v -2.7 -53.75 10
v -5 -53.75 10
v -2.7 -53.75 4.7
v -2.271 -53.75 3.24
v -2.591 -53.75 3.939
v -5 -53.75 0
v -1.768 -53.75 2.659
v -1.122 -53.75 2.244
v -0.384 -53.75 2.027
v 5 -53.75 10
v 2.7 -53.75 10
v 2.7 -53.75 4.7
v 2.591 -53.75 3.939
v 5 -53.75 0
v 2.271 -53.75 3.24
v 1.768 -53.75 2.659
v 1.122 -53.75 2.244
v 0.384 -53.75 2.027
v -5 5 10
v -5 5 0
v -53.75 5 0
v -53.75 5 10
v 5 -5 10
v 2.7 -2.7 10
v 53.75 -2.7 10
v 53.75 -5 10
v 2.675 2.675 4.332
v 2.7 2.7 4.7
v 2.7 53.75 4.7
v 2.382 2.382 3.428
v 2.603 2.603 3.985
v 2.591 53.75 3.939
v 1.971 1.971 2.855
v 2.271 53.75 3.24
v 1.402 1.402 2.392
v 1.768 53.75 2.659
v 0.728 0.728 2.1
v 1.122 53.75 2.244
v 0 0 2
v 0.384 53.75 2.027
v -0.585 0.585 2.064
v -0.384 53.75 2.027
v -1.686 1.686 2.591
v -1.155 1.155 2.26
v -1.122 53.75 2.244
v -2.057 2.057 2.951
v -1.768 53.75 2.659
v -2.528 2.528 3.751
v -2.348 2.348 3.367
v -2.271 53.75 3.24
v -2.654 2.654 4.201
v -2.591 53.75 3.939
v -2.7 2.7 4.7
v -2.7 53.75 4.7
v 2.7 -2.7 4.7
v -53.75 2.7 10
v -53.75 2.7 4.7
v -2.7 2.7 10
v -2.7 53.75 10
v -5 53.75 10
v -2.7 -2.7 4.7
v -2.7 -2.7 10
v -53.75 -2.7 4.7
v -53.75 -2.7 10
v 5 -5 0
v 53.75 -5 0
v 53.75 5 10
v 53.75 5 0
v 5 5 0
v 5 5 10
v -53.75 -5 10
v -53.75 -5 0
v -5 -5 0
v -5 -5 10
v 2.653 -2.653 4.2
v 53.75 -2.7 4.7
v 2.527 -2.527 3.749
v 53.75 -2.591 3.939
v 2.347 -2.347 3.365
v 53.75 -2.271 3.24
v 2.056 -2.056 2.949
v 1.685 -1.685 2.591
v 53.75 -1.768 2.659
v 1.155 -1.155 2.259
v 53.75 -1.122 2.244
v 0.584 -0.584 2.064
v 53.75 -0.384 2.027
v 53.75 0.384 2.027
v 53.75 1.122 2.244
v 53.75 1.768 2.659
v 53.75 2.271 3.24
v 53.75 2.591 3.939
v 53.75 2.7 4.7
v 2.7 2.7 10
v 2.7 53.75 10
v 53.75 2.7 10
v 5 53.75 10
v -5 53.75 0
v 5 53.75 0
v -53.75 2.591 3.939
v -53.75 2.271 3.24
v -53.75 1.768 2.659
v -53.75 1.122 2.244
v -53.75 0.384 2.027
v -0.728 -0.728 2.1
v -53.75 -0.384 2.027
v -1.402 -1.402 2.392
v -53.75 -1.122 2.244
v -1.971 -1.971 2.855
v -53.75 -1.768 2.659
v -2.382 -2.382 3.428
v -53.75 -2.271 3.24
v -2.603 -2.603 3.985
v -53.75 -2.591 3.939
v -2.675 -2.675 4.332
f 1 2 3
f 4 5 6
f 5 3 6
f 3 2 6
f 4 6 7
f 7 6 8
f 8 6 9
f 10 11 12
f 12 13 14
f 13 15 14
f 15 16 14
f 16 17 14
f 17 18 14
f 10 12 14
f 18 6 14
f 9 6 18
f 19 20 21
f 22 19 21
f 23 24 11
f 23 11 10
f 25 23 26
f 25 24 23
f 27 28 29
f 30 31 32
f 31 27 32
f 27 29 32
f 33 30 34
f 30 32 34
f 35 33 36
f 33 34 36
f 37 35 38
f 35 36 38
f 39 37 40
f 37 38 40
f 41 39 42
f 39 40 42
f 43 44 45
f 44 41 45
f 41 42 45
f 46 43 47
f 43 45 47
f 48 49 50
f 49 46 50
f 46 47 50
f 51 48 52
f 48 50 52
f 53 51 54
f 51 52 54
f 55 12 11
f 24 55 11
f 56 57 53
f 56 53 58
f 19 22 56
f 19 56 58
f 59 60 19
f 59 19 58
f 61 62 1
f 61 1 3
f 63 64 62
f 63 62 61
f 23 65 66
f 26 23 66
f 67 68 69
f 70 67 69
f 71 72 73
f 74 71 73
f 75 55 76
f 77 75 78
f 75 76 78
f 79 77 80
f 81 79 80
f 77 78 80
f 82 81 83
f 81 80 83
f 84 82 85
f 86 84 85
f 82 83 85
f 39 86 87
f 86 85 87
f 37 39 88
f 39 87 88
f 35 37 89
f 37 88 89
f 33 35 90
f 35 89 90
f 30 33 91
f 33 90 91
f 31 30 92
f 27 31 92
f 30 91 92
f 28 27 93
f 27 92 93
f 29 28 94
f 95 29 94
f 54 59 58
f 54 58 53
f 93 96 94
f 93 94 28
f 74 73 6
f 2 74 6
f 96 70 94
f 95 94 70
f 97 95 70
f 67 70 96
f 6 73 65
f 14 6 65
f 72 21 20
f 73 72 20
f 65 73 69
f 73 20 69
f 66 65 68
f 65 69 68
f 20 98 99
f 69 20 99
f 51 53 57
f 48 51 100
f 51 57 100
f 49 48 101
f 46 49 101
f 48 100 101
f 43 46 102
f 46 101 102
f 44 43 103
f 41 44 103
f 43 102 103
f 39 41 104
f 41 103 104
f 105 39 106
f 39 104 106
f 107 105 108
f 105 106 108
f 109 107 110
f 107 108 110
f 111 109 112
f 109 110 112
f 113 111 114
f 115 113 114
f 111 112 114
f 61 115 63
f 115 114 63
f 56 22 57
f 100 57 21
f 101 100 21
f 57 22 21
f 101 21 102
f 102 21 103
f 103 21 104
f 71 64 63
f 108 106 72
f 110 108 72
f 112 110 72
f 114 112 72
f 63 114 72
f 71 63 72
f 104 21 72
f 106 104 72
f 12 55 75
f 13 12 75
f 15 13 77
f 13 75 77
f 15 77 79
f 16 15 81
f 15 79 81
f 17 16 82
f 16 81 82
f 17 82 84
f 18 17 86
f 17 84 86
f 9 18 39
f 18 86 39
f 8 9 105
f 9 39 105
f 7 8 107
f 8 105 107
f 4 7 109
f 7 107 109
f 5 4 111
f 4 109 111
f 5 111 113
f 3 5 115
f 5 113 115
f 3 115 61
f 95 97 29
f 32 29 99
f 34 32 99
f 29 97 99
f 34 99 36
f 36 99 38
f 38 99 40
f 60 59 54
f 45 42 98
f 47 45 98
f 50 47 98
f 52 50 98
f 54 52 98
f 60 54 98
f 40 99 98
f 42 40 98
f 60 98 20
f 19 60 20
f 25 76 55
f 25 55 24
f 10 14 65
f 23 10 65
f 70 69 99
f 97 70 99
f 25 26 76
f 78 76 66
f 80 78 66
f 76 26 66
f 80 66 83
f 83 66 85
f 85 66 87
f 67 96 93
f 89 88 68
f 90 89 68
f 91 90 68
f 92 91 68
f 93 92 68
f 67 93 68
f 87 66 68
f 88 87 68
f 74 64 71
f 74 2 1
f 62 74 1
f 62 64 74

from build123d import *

# Parameters (mm, degrees)
PAD_DEPTH       = 10
POCKET_DEPTH    = 107.501
POCKET001_DEPTH = 53.75
POCKET002_DEPTH = 53.75


with BuildPart() as part:
    # Sketch → Pad (new body)
    with BuildSketch(Plane.XY):
        Polygon((-5, 53.75), (-5, 5), (-53.75, 5), (-53.75, -5), (-5, -5), (-5, -53.75), (5, -53.75), (5, -5), (53.75, -5), (53.75, 5), (5, 5), (5, 53.75), align=None)
    extrude(amount=PAD_DEPTH)

    # Sketch001 → Pocket (cut, through all)
    with BuildSketch(Plane(origin=(0, 53.75, 0), x_dir=(-1, 0, 0), z_dir=(0, 1, 0))):
        with BuildLine():
            ThreePointArc((-2.7, 4.699986), (7e-06, 2), (2.7, 4.7))
            Line((2.7, 10), (2.7, 4.7))
            Line((2.7, 10), (-2.7, 10))
            Line((-2.7, 4.699986), (-2.7, 10))
        make_face()
    extrude(amount=-POCKET_DEPTH, mode=Mode.SUBTRACT)

    # Sketch002 → Pocket001 (cut)
    with BuildSketch(Plane.YZ.offset(53.75)):
        with BuildLine():
            ThreePointArc((-2.7, 4.7), (0, 2), (2.7, 4.700001))
            Line((2.7, 10), (2.7, 4.700001))
            Line((2.7, 10), (-2.7, 10))
            Line((-2.7, 4.7), (-2.7, 10))
        make_face()
    extrude(amount=-POCKET001_DEPTH, mode=Mode.SUBTRACT)

    # Sketch003 → Pocket002 (cut)
    with BuildSketch(Plane(origin=(-53.75, 0, 0), x_dir=(0, -1, 0), z_dir=(-1, 0, 0))):
        with BuildLine():
            ThreePointArc((-2.7, 4.7), (0, 2), (2.7, 4.7))
            Line((2.7, 10), (2.7, 4.7))
            Line((-2.7, 10), (2.7, 10))
            Line((-2.7, 4.7), (-2.7, 10))
        make_face()
    extrude(amount=-POCKET002_DEPTH, mode=Mode.SUBTRACT)


solid = part.part
